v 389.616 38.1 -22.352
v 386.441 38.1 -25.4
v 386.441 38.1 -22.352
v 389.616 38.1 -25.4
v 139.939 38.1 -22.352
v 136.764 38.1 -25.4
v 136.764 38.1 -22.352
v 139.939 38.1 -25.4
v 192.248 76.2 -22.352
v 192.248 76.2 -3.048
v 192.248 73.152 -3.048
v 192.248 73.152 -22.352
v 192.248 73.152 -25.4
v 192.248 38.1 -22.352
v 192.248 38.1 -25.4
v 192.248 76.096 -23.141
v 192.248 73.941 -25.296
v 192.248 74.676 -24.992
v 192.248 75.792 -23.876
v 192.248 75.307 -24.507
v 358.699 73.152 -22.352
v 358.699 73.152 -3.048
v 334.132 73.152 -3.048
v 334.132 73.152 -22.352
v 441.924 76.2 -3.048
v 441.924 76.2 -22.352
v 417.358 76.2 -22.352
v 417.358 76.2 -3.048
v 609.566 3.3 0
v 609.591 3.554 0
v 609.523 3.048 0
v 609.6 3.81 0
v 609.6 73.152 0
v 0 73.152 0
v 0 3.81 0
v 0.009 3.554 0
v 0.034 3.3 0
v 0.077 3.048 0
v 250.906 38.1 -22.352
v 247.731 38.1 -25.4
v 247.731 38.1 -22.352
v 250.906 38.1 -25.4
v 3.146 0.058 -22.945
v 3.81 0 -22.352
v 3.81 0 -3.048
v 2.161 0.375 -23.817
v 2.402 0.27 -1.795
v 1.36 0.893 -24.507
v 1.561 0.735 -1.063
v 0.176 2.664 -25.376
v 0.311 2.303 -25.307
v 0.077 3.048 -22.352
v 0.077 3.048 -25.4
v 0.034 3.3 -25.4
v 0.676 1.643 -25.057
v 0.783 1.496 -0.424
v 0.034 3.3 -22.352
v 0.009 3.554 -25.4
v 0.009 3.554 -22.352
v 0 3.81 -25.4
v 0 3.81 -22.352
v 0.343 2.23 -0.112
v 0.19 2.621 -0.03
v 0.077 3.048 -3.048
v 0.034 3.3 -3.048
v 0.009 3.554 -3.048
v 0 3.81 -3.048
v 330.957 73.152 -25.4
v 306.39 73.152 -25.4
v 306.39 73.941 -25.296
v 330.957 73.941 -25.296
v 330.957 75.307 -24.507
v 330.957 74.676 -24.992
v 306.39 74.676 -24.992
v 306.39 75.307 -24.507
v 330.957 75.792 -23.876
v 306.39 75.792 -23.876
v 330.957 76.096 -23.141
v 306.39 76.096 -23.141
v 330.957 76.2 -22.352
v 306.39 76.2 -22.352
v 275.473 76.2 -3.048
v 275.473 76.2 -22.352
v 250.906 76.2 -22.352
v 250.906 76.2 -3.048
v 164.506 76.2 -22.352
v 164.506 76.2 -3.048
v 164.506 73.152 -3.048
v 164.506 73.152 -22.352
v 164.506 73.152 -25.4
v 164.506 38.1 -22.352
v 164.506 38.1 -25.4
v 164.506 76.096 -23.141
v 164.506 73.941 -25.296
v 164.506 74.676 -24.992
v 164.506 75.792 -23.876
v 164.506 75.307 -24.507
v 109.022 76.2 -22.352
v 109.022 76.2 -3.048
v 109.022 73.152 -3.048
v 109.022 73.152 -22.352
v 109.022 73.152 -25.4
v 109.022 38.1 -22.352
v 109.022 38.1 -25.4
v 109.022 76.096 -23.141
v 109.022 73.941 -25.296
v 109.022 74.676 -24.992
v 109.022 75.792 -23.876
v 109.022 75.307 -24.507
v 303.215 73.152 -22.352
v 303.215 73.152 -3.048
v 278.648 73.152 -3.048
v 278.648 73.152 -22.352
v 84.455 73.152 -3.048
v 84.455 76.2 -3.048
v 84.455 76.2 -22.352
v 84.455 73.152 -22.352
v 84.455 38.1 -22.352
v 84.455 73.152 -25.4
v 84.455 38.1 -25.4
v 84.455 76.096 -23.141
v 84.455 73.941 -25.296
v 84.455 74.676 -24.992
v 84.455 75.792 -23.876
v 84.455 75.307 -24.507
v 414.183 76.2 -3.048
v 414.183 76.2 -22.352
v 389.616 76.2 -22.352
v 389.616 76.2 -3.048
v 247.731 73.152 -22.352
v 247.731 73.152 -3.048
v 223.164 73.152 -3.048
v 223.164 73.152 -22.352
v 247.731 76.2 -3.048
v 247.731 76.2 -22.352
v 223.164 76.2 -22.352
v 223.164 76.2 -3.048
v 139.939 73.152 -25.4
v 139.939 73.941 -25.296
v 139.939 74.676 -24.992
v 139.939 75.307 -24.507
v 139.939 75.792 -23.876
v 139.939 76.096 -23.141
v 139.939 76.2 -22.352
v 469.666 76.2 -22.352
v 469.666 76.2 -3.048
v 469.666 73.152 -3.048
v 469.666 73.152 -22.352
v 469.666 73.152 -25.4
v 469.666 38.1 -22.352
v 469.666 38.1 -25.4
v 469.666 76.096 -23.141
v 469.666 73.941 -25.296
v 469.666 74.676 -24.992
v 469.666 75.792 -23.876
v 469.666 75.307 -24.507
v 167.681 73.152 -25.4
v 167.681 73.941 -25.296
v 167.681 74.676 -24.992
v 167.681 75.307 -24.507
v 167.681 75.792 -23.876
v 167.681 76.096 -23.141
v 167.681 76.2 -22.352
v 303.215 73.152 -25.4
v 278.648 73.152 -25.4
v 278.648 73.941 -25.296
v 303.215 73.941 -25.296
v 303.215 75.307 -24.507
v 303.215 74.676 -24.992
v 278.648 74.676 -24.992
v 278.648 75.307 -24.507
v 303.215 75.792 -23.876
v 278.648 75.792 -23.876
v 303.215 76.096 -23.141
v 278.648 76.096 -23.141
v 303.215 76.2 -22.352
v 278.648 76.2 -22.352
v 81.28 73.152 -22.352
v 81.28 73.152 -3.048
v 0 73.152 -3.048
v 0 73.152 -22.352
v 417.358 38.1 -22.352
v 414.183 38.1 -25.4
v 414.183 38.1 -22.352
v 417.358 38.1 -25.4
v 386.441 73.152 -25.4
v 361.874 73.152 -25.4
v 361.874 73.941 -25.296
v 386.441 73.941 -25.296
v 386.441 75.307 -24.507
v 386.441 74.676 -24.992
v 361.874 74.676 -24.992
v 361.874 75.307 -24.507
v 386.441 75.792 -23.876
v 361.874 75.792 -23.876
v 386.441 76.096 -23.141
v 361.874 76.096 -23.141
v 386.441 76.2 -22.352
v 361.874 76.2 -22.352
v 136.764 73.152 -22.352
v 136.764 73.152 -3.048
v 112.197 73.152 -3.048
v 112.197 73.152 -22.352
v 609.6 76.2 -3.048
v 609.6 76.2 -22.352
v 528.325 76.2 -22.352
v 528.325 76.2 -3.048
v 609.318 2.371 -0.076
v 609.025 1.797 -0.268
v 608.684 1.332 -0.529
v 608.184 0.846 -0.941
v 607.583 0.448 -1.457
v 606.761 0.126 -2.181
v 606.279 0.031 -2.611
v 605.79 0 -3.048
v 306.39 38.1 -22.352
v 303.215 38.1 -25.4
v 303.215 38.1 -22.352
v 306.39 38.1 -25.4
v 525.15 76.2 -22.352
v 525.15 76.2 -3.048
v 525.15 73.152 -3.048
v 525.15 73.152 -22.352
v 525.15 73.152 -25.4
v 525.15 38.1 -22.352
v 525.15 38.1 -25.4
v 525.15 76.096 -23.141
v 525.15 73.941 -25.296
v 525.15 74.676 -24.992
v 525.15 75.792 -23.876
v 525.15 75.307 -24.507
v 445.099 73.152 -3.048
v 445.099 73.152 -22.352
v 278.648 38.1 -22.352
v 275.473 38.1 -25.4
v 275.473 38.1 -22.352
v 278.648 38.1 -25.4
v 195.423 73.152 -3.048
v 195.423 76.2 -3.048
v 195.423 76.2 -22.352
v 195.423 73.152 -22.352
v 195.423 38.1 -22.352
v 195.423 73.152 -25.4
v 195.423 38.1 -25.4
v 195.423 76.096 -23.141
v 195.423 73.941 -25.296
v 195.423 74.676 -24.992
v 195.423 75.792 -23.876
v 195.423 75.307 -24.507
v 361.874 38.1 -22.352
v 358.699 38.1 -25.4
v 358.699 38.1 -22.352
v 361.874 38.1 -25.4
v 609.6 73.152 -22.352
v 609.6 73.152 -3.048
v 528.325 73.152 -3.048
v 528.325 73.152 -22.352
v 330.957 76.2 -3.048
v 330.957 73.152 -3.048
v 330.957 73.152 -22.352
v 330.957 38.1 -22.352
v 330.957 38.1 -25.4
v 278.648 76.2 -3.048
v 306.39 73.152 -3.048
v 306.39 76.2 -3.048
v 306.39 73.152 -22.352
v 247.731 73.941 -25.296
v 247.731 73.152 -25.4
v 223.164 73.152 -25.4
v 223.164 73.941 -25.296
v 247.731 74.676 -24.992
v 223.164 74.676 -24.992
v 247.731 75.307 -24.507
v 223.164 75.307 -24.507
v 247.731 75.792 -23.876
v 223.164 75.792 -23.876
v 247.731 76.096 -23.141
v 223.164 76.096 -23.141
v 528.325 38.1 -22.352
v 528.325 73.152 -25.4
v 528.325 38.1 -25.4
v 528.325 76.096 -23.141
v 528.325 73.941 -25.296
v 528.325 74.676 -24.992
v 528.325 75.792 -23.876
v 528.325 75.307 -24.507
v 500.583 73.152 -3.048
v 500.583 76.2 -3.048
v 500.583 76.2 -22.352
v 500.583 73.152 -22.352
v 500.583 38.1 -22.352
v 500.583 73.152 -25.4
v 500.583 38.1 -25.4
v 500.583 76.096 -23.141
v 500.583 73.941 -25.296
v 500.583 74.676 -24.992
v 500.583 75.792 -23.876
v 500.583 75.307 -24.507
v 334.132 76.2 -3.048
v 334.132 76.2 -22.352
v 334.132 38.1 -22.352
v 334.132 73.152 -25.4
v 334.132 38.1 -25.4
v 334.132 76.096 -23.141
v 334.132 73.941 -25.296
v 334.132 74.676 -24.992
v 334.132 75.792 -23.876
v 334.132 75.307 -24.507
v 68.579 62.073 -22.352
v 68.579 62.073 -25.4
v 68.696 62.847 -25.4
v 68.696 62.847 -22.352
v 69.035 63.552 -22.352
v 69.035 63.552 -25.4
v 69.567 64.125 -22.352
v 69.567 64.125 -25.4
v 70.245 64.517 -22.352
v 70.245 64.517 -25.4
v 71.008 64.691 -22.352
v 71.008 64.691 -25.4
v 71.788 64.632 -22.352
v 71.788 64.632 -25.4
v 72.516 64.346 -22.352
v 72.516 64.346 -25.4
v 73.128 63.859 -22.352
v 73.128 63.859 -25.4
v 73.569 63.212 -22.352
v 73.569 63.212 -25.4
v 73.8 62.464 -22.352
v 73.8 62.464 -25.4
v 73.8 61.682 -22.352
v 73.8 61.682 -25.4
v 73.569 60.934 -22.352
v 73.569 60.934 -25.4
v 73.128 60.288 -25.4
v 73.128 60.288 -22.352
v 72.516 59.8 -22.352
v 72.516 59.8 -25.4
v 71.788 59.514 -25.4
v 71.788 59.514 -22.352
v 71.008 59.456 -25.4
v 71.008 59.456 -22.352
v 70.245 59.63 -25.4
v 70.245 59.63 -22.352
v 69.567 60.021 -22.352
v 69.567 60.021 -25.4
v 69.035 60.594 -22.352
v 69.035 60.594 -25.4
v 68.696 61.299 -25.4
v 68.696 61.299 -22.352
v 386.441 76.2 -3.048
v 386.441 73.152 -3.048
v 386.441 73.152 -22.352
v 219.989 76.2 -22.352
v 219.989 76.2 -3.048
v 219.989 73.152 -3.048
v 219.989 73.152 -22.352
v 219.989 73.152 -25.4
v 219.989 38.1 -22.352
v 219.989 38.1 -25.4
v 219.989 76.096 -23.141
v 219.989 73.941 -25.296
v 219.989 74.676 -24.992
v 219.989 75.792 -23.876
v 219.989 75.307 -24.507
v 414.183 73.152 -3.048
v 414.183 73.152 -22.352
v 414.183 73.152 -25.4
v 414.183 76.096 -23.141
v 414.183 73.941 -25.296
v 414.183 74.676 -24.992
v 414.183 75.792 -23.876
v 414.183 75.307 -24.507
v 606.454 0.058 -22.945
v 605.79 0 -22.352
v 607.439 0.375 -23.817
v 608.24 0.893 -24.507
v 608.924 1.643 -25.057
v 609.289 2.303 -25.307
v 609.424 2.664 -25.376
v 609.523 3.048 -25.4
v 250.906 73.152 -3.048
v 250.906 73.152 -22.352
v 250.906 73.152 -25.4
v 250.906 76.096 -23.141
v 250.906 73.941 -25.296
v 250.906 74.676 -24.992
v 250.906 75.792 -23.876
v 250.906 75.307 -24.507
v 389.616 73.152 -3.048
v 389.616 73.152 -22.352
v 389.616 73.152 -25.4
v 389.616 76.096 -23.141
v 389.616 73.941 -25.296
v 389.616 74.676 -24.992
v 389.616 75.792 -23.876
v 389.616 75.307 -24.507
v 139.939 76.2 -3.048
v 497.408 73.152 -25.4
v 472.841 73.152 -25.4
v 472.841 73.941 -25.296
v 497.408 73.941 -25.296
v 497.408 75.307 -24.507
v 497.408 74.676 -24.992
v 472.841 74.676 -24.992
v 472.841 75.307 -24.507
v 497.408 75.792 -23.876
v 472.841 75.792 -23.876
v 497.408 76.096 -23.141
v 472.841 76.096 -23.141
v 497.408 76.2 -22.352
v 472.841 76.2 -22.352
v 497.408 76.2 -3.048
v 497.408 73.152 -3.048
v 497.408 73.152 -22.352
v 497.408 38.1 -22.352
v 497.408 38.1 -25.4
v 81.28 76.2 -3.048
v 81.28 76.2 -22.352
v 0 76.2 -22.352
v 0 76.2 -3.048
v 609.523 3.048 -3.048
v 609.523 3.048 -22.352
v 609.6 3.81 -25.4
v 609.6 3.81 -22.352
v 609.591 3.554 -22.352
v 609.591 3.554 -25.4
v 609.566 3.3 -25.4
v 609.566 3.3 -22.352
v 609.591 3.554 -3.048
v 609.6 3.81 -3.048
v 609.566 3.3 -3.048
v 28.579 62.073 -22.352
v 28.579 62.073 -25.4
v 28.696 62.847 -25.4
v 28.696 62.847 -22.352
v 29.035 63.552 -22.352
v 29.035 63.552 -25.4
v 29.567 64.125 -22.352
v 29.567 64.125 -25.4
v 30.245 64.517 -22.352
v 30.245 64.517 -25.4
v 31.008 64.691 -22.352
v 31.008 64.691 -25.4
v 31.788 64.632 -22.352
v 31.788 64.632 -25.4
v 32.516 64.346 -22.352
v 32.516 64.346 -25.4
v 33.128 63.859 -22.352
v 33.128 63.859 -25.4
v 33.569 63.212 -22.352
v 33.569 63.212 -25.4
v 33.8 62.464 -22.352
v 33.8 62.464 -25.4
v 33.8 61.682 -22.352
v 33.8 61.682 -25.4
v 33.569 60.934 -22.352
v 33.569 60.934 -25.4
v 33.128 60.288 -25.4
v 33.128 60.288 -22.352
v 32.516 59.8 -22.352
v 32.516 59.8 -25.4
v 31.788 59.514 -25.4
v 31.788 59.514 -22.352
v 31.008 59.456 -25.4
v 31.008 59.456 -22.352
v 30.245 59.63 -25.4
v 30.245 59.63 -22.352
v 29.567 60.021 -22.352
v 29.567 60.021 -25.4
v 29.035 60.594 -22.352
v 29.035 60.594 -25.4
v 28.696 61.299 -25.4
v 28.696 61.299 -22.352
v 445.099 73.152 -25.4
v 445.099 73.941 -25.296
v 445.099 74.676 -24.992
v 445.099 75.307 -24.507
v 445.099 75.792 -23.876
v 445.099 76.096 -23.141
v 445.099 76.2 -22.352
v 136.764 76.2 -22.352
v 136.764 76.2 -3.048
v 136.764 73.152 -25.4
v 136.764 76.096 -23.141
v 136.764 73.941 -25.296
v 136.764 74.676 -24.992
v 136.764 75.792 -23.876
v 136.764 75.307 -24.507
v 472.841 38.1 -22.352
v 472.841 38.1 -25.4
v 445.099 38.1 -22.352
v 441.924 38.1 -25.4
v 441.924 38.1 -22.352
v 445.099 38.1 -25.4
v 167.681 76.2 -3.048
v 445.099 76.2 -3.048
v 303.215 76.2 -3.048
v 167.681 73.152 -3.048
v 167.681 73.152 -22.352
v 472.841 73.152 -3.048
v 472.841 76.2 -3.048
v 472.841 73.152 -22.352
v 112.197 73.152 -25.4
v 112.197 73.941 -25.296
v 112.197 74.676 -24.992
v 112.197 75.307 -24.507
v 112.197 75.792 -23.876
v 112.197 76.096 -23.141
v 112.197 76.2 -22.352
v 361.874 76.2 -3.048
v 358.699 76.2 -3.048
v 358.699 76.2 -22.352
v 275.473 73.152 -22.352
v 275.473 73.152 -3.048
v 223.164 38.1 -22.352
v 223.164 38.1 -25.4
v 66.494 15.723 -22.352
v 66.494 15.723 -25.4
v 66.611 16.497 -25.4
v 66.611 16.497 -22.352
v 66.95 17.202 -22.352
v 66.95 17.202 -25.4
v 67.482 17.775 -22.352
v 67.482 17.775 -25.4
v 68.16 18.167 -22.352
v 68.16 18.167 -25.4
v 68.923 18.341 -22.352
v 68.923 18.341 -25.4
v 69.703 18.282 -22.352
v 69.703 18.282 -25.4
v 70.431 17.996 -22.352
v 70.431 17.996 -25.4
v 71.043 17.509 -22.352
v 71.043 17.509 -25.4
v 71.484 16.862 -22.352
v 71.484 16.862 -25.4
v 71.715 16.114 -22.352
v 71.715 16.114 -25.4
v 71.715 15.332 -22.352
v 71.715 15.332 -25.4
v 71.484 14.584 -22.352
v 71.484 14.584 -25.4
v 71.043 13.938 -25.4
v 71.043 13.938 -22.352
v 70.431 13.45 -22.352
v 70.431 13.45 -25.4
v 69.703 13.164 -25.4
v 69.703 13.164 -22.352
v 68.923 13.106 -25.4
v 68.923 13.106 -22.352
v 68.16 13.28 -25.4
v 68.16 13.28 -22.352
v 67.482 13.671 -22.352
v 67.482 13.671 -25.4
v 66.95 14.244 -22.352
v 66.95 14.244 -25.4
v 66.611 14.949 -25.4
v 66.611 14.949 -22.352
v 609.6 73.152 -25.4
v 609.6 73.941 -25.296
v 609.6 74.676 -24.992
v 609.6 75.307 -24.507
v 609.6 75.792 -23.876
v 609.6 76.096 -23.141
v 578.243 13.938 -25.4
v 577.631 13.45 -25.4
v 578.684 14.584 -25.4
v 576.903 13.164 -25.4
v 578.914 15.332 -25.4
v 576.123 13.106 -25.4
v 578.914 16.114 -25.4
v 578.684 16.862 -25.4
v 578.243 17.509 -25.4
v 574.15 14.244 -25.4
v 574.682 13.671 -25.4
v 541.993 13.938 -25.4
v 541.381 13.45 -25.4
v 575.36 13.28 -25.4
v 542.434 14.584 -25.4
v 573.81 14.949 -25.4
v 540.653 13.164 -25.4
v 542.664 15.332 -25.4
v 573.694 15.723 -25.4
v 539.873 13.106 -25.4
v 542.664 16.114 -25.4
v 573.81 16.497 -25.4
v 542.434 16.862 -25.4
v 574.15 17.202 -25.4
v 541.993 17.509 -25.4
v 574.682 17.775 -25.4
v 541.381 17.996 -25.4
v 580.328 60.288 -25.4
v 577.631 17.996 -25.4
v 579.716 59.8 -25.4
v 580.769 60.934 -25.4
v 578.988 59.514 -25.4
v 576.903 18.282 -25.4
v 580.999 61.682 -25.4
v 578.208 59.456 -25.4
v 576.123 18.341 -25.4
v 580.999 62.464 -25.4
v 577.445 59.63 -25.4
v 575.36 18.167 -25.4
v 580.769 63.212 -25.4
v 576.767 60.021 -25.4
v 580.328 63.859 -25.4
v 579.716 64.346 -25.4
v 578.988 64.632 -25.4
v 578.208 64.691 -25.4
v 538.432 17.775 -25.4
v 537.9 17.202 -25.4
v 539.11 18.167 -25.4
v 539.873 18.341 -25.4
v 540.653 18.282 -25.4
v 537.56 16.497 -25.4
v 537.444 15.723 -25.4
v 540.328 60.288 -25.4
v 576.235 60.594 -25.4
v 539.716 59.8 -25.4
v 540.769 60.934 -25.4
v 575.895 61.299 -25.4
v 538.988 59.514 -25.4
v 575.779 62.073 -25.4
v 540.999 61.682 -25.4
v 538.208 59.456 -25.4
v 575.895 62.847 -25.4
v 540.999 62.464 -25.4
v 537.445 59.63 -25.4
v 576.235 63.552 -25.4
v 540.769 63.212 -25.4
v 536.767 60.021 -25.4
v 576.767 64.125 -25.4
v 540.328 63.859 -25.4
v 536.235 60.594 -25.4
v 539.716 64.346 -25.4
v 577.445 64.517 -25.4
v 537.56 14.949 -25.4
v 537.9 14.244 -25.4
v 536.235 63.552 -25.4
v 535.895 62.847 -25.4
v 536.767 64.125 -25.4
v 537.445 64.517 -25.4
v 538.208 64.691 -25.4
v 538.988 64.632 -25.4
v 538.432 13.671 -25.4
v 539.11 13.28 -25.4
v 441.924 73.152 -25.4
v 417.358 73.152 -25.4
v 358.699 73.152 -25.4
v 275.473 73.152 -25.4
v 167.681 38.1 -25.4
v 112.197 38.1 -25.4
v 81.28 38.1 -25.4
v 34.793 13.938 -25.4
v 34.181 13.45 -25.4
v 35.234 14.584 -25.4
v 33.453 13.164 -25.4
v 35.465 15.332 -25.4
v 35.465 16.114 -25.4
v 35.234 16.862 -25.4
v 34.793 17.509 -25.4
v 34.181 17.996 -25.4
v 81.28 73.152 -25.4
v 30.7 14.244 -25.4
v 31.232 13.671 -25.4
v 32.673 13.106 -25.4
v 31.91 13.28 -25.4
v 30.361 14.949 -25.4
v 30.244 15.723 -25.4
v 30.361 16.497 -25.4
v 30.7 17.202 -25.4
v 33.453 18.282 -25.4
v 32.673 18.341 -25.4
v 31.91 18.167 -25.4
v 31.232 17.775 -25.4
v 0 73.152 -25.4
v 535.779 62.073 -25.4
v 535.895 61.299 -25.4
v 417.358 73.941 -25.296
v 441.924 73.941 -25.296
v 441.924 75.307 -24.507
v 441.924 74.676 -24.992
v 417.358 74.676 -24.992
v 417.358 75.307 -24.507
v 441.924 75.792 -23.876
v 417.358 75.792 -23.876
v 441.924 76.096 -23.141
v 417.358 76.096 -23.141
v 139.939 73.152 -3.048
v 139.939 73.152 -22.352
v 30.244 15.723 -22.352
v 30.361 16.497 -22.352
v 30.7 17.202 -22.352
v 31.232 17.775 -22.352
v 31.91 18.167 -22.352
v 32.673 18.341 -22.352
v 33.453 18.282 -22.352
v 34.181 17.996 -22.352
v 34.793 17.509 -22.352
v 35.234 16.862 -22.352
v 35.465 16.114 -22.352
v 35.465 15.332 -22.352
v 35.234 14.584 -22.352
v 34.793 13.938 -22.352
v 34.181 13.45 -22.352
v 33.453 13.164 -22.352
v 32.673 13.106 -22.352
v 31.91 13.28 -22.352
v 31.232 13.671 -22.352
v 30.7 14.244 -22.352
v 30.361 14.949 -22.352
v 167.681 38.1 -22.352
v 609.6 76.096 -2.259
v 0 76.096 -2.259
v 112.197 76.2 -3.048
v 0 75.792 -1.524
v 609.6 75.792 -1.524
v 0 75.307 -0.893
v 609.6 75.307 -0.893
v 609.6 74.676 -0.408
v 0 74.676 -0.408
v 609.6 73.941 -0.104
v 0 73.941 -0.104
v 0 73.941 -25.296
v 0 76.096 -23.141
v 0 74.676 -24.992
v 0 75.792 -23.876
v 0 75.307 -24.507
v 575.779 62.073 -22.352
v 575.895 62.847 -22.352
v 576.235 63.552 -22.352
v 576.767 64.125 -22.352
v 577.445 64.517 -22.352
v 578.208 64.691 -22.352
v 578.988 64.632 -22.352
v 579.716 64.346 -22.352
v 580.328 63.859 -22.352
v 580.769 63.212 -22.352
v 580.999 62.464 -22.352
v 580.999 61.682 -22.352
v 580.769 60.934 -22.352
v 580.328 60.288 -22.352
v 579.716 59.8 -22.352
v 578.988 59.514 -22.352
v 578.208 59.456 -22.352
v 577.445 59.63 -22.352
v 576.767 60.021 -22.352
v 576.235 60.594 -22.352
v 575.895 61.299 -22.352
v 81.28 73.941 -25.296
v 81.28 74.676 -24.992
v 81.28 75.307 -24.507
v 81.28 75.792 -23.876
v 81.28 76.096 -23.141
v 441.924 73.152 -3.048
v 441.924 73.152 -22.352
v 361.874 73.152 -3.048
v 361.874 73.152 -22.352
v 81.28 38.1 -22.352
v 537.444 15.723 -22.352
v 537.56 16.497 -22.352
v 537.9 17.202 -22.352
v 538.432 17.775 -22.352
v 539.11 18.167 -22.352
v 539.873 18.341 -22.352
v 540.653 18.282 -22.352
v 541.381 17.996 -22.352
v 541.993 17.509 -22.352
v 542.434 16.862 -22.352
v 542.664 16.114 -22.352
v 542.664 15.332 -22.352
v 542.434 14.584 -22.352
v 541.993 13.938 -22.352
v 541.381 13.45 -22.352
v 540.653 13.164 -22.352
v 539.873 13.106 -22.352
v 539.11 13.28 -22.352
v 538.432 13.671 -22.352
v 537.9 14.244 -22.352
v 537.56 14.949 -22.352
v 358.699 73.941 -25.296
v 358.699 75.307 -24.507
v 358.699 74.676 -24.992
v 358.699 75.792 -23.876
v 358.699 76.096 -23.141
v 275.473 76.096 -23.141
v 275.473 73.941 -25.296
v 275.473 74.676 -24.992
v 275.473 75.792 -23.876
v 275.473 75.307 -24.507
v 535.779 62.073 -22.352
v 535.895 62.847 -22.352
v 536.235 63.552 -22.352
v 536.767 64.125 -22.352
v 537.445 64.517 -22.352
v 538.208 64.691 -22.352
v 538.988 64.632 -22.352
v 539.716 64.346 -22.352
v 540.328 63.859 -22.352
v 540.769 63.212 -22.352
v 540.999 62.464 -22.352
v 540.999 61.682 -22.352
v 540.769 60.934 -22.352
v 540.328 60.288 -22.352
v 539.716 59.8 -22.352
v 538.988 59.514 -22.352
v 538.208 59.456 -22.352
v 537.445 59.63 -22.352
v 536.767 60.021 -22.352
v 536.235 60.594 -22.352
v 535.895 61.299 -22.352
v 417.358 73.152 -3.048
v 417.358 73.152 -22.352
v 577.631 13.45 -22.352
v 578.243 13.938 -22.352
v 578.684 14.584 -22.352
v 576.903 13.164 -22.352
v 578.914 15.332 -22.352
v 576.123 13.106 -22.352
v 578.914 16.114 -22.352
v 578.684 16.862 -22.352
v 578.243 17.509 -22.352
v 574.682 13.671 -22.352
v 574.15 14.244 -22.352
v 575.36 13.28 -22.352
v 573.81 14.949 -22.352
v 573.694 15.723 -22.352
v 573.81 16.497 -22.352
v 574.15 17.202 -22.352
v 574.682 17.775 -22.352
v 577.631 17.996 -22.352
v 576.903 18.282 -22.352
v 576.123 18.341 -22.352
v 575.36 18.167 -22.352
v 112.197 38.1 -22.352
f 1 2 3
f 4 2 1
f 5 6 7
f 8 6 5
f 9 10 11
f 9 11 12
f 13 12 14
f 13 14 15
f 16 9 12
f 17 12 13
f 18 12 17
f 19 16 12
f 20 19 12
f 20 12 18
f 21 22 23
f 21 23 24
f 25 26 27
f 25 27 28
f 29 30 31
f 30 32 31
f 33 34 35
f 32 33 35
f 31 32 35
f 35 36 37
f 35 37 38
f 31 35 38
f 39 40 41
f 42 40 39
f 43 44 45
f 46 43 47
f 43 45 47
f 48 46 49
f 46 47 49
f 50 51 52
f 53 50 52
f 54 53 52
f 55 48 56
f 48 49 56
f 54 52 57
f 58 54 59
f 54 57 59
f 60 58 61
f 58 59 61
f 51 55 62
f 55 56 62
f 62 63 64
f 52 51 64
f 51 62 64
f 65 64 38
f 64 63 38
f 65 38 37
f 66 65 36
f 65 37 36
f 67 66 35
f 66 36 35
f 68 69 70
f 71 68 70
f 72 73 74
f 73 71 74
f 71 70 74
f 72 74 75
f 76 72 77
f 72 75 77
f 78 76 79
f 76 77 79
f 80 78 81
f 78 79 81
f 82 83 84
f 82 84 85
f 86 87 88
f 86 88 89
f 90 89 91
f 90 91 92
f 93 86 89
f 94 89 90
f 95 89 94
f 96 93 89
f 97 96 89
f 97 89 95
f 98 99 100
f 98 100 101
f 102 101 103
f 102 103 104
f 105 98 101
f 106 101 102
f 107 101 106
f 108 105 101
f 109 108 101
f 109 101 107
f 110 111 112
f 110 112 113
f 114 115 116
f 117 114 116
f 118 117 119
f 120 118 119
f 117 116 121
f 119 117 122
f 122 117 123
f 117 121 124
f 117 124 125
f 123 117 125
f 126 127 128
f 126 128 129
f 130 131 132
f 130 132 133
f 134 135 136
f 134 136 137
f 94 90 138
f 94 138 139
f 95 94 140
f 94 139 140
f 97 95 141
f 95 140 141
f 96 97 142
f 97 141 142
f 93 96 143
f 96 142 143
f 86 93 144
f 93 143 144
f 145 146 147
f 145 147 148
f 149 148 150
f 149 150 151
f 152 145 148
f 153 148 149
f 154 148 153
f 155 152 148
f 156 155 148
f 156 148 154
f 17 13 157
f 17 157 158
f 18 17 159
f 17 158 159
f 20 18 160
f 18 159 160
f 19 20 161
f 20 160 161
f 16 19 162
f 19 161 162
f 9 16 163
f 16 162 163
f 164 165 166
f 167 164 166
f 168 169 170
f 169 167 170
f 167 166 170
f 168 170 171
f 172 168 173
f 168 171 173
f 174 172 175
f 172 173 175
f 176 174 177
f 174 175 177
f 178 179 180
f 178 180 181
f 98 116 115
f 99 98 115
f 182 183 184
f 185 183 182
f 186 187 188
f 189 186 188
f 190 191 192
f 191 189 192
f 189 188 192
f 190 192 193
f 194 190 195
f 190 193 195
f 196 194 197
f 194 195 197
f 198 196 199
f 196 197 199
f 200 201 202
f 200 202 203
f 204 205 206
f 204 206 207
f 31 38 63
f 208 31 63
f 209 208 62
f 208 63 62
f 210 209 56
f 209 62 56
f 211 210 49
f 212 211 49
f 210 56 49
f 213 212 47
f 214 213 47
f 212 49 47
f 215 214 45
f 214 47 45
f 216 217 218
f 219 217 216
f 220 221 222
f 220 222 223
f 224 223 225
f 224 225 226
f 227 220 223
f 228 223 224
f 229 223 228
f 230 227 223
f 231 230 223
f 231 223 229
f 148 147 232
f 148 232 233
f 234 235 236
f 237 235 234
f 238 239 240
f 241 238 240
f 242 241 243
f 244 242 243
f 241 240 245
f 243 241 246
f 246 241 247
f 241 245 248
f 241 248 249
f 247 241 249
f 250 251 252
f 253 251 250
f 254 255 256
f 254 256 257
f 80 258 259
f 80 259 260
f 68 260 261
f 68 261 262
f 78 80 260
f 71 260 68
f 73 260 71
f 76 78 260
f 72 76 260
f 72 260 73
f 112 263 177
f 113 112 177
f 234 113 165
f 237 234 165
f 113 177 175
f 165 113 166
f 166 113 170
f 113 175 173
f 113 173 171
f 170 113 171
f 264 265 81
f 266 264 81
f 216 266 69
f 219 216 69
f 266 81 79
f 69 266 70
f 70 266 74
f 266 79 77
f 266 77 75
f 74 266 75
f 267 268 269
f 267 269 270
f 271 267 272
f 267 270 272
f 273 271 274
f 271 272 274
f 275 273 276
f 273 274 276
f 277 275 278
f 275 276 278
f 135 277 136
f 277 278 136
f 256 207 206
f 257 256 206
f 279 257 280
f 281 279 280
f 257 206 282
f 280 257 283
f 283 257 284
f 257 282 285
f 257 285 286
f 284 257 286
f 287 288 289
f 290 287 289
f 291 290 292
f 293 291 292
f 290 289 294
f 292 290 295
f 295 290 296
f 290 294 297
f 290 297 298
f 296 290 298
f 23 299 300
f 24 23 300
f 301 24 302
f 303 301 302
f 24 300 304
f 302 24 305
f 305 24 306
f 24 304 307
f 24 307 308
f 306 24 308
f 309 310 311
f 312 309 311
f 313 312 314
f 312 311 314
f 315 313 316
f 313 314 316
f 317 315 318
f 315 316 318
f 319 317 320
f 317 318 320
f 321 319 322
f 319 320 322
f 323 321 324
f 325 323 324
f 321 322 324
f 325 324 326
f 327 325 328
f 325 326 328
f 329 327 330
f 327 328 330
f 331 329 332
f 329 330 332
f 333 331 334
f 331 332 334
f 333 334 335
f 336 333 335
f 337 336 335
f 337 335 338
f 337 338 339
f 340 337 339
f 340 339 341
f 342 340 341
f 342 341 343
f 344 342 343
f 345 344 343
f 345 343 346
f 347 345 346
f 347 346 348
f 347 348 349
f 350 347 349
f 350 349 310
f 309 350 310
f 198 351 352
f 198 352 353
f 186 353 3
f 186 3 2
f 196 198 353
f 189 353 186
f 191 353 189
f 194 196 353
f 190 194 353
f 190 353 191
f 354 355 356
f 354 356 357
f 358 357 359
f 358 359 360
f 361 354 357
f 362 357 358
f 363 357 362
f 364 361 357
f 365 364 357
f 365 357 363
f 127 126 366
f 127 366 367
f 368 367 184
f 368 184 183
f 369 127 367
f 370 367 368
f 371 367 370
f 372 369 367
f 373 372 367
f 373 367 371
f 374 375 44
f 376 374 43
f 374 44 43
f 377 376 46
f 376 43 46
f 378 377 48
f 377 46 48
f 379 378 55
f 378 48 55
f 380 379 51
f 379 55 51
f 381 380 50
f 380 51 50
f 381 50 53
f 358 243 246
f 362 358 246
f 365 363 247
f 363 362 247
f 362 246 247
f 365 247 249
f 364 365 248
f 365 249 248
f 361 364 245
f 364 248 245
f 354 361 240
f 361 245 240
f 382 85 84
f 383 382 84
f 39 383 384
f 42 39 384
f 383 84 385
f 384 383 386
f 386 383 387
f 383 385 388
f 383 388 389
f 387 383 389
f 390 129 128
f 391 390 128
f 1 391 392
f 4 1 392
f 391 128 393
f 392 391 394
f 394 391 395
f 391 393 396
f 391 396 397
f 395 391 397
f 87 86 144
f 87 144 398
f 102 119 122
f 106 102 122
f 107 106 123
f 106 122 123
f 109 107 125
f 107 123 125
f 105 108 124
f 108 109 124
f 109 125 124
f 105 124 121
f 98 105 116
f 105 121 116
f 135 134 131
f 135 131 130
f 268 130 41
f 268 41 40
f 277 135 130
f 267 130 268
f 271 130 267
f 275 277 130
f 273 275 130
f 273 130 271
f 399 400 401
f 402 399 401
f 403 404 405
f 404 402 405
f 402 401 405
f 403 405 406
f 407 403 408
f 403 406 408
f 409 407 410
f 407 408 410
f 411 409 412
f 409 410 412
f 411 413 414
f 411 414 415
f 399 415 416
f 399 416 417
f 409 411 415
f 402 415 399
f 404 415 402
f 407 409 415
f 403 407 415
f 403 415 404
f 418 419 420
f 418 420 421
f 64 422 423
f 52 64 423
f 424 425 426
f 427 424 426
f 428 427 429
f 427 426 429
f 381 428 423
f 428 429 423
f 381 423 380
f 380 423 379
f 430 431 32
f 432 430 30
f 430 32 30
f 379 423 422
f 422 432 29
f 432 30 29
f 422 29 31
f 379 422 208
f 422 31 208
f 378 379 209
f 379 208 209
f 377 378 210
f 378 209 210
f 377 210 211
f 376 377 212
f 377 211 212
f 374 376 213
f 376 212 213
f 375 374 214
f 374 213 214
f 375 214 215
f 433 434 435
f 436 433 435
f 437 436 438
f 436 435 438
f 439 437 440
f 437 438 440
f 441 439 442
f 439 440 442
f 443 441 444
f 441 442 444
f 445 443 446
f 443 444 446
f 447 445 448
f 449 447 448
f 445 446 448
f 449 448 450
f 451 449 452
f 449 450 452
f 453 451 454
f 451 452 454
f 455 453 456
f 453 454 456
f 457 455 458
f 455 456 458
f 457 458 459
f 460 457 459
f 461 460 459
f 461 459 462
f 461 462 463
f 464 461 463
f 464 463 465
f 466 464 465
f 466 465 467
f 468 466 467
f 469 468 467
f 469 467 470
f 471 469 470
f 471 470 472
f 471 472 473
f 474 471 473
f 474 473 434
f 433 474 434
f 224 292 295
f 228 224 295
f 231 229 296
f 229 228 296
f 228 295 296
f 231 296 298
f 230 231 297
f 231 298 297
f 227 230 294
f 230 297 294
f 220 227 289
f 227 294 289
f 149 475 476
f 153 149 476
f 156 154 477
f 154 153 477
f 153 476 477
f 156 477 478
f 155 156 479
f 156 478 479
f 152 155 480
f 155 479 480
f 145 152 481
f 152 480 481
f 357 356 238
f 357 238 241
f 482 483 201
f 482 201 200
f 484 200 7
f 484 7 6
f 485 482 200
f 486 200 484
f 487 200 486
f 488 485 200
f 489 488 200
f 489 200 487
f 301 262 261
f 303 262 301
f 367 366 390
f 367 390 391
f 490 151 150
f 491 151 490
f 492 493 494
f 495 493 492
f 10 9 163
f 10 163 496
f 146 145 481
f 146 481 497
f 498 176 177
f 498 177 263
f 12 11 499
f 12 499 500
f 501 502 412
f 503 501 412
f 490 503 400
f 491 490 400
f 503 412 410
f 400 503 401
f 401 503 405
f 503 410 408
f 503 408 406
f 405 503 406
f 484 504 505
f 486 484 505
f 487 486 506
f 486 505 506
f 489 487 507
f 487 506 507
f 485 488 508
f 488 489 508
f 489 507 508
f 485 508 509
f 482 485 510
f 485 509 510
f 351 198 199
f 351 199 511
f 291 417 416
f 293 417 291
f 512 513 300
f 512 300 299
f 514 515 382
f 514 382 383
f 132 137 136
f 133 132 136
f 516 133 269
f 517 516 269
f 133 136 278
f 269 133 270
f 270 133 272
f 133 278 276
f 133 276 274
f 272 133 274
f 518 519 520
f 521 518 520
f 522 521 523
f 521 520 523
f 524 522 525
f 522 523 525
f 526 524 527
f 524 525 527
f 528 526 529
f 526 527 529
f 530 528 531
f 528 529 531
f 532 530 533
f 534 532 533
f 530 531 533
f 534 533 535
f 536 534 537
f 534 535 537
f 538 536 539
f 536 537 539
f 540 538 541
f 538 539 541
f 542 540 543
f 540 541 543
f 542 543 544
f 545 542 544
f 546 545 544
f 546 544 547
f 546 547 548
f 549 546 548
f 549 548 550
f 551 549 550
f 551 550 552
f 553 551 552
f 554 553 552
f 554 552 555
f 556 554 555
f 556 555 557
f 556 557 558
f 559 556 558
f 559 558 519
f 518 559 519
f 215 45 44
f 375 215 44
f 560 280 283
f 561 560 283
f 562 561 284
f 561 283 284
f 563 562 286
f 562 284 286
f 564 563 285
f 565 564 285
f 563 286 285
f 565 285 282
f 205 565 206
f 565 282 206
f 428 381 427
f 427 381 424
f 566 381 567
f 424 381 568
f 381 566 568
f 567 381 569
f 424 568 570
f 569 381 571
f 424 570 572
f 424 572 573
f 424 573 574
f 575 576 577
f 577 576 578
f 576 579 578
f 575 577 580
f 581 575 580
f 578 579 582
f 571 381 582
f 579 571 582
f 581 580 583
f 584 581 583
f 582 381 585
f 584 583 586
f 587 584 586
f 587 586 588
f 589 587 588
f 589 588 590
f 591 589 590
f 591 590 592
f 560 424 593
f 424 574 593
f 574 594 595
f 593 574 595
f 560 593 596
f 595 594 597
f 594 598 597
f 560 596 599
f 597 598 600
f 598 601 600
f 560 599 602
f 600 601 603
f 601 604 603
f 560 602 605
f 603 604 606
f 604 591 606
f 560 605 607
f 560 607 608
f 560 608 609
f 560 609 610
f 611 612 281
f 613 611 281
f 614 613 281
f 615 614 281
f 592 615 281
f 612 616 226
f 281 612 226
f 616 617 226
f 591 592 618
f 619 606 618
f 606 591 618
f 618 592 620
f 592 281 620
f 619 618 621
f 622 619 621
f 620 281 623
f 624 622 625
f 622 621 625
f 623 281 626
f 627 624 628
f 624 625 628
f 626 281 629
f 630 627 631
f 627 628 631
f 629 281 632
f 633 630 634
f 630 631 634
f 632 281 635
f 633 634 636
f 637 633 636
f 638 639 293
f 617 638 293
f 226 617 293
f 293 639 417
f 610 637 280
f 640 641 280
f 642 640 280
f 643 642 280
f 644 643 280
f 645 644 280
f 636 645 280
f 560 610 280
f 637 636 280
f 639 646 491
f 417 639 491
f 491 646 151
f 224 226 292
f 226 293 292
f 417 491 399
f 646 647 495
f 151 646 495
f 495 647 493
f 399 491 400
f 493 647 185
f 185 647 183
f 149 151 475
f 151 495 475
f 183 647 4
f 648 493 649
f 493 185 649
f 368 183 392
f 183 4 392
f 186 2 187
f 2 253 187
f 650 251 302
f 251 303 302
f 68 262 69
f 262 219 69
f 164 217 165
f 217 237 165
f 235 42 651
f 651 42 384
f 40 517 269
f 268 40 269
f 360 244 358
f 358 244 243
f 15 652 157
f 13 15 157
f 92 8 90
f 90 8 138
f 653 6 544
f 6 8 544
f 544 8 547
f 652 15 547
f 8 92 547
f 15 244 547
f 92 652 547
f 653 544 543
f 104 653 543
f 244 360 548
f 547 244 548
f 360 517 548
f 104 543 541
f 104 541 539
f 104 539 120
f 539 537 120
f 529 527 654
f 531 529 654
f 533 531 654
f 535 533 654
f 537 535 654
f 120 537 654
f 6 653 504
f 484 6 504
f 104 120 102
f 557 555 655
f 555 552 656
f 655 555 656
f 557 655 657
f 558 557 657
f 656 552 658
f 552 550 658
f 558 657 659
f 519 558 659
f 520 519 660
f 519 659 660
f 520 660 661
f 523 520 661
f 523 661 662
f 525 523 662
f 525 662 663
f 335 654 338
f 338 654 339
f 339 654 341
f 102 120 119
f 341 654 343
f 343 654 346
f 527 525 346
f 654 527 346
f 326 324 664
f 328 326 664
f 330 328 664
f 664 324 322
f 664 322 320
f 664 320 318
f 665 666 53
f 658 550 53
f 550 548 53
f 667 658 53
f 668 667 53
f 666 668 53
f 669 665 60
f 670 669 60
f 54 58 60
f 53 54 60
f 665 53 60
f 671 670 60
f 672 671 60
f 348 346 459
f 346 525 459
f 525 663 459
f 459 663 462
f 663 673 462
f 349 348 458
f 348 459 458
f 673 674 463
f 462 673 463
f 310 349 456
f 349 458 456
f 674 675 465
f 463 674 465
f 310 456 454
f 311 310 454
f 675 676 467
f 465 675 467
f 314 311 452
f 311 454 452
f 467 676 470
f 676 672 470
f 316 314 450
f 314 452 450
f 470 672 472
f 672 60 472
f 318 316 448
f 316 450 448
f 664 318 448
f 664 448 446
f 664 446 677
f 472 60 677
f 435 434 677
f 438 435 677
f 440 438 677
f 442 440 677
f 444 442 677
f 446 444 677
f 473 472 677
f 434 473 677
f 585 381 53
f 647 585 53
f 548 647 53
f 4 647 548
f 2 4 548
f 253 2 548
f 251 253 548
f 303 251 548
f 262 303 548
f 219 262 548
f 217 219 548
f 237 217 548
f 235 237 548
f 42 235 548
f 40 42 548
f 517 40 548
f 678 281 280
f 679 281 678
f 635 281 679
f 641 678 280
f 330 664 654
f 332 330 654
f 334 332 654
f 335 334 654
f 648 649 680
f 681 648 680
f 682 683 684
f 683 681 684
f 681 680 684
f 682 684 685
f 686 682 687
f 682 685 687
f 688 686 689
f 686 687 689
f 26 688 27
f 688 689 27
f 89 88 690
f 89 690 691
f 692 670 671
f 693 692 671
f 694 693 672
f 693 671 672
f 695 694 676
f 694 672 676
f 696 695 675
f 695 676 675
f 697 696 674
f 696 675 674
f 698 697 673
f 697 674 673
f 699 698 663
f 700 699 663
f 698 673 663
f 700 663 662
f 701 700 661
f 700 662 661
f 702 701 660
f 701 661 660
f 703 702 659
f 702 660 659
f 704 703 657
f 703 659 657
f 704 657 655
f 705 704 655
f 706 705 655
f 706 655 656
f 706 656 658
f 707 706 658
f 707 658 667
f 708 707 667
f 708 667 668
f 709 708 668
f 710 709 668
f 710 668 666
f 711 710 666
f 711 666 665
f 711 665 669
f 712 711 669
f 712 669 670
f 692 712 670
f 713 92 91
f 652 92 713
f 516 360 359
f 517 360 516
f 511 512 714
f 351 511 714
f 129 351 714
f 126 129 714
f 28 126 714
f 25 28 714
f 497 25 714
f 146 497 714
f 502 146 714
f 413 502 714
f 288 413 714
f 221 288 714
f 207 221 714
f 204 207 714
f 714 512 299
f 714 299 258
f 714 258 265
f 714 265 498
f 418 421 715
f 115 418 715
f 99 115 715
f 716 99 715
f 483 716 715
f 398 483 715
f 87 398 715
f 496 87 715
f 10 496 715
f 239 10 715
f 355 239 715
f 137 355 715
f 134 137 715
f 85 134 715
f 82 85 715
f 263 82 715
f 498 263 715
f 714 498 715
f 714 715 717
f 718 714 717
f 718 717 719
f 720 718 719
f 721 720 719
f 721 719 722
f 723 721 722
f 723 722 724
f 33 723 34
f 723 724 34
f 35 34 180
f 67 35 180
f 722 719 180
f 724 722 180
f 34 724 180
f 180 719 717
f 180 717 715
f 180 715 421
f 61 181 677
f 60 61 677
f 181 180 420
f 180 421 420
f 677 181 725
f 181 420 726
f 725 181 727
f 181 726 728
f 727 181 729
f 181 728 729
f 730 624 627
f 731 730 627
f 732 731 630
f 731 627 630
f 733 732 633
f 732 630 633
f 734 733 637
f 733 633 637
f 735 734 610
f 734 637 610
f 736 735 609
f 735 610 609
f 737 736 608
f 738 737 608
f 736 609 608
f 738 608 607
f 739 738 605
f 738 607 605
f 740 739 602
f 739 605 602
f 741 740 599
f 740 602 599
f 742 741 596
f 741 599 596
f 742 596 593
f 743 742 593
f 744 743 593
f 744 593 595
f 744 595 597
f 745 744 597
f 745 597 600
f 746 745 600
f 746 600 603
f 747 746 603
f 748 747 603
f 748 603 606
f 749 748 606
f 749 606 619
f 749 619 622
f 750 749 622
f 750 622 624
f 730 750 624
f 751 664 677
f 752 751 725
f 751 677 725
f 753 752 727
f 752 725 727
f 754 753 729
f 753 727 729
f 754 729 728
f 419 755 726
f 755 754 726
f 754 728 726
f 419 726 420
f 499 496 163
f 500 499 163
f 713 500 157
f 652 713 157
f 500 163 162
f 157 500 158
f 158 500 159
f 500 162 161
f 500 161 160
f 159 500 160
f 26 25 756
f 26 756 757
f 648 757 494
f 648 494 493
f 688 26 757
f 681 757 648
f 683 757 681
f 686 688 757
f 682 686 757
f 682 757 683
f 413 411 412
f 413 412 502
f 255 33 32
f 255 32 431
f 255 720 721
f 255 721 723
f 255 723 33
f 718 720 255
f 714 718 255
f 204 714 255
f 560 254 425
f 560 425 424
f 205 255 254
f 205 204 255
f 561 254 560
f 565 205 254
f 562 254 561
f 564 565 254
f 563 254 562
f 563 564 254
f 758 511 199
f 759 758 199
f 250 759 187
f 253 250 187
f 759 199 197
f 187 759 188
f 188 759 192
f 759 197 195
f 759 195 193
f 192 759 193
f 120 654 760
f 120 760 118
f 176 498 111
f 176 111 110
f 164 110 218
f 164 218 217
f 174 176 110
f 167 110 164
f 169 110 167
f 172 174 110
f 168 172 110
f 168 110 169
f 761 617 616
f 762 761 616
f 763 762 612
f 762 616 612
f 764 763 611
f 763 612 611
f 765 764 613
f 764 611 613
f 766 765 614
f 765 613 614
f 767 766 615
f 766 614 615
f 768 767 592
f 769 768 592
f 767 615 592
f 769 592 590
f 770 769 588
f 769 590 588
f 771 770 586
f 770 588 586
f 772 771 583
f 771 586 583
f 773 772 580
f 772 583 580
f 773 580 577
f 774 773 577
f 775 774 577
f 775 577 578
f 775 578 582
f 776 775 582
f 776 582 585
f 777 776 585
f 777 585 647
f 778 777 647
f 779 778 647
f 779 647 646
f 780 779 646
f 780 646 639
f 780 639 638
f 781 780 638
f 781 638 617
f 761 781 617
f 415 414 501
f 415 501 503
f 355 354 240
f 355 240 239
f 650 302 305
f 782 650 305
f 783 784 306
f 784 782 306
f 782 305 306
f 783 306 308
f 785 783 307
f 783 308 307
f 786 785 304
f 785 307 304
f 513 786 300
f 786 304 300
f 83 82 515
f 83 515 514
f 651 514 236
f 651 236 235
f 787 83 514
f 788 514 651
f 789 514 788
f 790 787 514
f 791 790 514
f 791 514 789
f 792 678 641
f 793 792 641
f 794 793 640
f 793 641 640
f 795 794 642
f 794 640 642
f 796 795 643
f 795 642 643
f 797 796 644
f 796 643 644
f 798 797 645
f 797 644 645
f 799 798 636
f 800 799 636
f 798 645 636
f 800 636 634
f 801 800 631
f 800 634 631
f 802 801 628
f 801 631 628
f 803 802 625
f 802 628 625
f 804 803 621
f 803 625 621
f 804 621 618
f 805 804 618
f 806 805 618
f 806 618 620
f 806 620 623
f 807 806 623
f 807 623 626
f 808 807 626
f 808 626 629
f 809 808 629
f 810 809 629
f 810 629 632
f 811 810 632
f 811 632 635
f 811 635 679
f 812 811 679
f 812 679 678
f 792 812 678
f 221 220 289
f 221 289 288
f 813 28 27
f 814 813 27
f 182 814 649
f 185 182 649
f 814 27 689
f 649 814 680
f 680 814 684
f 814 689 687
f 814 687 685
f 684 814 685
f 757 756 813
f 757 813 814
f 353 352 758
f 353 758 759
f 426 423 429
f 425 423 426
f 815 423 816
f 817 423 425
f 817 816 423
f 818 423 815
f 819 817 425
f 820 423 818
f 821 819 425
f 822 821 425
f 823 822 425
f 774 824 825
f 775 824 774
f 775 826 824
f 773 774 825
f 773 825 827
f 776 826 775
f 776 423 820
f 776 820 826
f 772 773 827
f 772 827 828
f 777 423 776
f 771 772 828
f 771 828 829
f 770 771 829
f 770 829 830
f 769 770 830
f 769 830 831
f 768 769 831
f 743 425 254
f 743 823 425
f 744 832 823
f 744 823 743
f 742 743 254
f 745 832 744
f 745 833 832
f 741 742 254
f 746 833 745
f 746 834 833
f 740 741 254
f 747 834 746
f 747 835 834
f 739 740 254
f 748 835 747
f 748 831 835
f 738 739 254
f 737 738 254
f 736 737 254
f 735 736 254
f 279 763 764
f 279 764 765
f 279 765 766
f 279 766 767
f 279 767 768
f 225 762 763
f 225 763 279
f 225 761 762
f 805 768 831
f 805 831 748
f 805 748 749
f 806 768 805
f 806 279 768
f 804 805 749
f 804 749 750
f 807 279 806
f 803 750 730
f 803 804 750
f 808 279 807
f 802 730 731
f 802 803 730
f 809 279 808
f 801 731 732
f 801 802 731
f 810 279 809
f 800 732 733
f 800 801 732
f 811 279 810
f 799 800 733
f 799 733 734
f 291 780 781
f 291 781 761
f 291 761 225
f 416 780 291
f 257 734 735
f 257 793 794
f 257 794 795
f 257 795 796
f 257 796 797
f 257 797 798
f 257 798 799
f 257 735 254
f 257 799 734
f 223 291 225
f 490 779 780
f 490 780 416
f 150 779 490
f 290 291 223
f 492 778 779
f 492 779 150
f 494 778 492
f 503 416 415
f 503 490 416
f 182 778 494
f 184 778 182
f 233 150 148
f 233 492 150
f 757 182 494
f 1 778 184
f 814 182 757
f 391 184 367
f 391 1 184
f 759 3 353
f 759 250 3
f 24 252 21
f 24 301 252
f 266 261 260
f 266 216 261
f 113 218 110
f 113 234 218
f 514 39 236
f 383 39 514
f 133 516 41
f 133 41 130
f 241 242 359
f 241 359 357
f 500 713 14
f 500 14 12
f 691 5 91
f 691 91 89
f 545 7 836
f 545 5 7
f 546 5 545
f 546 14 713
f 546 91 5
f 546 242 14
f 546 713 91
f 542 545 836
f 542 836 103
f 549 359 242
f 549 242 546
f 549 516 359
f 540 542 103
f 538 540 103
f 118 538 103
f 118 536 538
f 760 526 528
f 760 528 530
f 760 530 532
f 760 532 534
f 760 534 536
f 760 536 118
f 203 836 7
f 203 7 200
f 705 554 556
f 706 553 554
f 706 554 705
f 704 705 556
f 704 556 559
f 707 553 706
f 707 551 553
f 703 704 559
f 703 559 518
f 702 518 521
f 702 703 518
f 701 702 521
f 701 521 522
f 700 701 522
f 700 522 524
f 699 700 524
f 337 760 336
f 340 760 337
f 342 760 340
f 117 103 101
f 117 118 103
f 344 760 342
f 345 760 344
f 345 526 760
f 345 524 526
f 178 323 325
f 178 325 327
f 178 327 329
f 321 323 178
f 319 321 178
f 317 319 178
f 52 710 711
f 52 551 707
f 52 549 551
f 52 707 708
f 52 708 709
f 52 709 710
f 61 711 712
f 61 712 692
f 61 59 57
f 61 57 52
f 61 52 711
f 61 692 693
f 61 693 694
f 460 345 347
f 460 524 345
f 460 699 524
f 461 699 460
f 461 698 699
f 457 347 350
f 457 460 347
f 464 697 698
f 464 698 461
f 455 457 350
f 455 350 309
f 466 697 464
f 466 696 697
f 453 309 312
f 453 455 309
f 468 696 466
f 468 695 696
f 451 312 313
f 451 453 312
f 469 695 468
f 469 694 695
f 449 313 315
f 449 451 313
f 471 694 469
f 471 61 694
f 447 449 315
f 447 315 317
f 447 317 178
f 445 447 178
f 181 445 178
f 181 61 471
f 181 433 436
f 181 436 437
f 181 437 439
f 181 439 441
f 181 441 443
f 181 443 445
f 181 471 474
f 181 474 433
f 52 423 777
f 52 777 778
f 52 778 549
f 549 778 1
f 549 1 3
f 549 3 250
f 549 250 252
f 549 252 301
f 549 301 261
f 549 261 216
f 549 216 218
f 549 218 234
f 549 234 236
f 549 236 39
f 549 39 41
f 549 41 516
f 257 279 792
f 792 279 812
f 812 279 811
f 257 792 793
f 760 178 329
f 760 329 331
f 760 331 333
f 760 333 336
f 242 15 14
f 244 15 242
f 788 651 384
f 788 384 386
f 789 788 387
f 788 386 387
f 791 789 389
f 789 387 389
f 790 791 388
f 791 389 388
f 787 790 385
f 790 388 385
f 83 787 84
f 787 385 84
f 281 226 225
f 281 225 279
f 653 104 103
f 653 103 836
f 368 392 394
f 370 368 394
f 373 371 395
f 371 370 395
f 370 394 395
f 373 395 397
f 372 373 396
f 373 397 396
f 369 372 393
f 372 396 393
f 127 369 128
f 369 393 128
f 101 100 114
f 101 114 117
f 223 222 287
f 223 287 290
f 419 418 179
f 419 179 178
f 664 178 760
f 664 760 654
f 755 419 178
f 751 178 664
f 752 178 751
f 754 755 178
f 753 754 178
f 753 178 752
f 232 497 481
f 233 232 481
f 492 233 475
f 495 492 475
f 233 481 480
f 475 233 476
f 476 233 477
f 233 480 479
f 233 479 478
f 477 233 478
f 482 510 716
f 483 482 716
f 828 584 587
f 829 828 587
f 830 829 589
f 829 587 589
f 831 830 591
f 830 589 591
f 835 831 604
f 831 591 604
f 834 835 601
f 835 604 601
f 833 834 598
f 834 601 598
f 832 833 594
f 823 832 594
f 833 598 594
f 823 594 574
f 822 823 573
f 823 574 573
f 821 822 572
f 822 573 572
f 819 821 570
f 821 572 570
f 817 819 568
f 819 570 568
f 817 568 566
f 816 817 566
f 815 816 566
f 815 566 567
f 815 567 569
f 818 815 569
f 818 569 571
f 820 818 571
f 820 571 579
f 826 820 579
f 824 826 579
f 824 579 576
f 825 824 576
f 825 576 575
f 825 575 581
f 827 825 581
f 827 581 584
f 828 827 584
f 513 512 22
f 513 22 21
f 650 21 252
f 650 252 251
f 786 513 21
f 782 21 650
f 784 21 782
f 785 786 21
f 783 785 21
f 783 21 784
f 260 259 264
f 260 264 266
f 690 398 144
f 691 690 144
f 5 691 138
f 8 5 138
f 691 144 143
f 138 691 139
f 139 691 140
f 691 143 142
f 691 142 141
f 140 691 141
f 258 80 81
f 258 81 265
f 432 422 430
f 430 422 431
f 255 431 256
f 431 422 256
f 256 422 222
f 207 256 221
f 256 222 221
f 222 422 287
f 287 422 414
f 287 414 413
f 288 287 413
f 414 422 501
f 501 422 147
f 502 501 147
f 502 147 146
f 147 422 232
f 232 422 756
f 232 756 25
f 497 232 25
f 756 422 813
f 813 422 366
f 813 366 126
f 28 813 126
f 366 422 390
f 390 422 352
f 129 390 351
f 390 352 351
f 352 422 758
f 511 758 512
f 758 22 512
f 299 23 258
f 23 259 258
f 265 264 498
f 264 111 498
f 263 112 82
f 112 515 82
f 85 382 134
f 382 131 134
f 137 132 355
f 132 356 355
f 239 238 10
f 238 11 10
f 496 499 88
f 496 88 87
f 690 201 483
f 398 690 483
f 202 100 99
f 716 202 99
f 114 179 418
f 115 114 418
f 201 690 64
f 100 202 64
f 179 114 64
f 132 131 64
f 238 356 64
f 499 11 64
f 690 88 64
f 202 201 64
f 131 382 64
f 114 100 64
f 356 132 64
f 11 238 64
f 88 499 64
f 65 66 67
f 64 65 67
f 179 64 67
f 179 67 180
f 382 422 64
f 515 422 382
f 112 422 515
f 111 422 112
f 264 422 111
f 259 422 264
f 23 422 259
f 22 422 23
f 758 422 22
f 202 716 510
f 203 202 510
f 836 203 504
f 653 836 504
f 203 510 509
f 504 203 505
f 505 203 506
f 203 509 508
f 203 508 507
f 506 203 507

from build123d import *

# Parameters (mm, degrees)
SKETCH1_W           = 19.304
SKETCH1_H           = 70.104
BOSS_EXTRUDE1_DEPTH = 609.6
SKETCH2_W           = 3.175
SKETCH2_H           = 38.1
CUT_EXTRUDE1_DEPTH  = 38.1
LPATTERN1_COUNT     = 17
LPATTERN1_PITCH     = 27.74188
FILLET1_R           = 3.81
SKETCH4_R           = 2.625
CUT_EXTRUDE2_DEPTH  = 6.35
LPATTERN2_COUNT     = 2
LPATTERN2_PITCH     = 507.1999


with BuildPart() as part:
    # Sketch1 → Boss-Extrude1 (new body)
    with BuildSketch(Plane(origin=(0, 0, 0), x_dir=(0, 0, -1), z_dir=(1, 0, 0))):
        with BuildLine():
            Line((3.048, 0), (22.352, 0))
            ThreePointArc((22.352, 0), (24.507261469, 0.892738531), (25.4, 3.048))
            Line((25.4, 3.048), (25.4, 73.152))
            ThreePointArc((25.4, 73.152), (24.507261469, 75.307261469), (22.352, 76.2))
            Line((22.352, 76.2), (3.048, 76.2))
            ThreePointArc((3.048, 76.2), (0.892738531, 75.307261469), (0, 73.152))
            Line((0, 73.152), (0, 3.048))
            ThreePointArc((0, 3.048), (0.892738531, 0.892738531), (3.048, 0))
        make_face()
        with Locations((12.7, 38.1)):
            Rectangle(SKETCH1_W, SKETCH1_H, mode=Mode.SUBTRACT)
    extrude(amount=BOSS_EXTRUDE1_DEPTH)

    # Sketch2 → Cut-Extrude1 (cut)
    with BuildSketch(Plane(origin=(0, 76.2, 0), x_dir=(1, 0, 0), z_dir=(0, 1, 0))):
        with Locations((82.8675, 22.098)):
            Rectangle(SKETCH2_W, SKETCH2_H)
    cut_extrude1 = extrude(amount=-CUT_EXTRUDE1_DEPTH, mode=Mode.SUBTRACT)

    # LPattern1: Cut-Extrude1 ×17
    with Locations(*[(i * LPATTERN1_PITCH, 0, 0) for i in range(1, LPATTERN1_COUNT)]):
        add(cut_extrude1, mode=Mode.SUBTRACT)

    # Fillet1
    # the kernel refuses this fillet: 3.81 mm, written as the material it takes off along each edge
    with BuildSketch(Plane(origin=(609.6, 0, 6.477), x_dir=(0, 1, 0), z_dir=(0, 0, -1))) as fillet1_piece_1:
        with BuildLine():
            CenterArc((FILLET1_R, -FILLET1_R), FILLET1_R, 90, 90)
            Line((0, -FILLET1_R), (0, 0))
            Line((0, 0), (FILLET1_R, 0))
        make_face()
    extrude(amount=38.354, mode=Mode.SUBTRACT)
    with BuildSketch(Plane(origin=(0, 0, 6.477), x_dir=(0, 1, 0), z_dir=(0, 0, -1))) as fillet1_piece_2:
        with BuildLine():
            CenterArc((FILLET1_R, FILLET1_R), FILLET1_R, 180, 90)
            Line((0, FILLET1_R), (0, 0))
            Line((0, 0), (FILLET1_R, 0))
        make_face()
    extrude(amount=38.354, mode=Mode.SUBTRACT)

    # Sketch4 → Cut-Extrude2 (cut)
    with BuildSketch(Plane(origin=(0, 0, -25.4), x_dir=(-1, 0, 0), z_dir=(0, 0, -1))):
        with Locations((-578.4038, 62.073165047)):
            Circle(SKETCH4_R)
        with Locations((-538.4038, 62.073165047)):
            Circle(SKETCH4_R)
        with Locations((-540.0688, 15.723165047)):
            Circle(SKETCH4_R)
        with Locations((-576.3188, 15.723165047)):
            Circle(SKETCH4_R)
    cut_extrude2 = extrude(amount=-CUT_EXTRUDE2_DEPTH, mode=Mode.SUBTRACT)

    # LPattern2: Cut-Extrude2 ×2
    with Locations(*[(-i * LPATTERN2_PITCH, 0, 0) for i in range(1, LPATTERN2_COUNT)]):
        add(cut_extrude2, mode=Mode.SUBTRACT)


solid = part.part
